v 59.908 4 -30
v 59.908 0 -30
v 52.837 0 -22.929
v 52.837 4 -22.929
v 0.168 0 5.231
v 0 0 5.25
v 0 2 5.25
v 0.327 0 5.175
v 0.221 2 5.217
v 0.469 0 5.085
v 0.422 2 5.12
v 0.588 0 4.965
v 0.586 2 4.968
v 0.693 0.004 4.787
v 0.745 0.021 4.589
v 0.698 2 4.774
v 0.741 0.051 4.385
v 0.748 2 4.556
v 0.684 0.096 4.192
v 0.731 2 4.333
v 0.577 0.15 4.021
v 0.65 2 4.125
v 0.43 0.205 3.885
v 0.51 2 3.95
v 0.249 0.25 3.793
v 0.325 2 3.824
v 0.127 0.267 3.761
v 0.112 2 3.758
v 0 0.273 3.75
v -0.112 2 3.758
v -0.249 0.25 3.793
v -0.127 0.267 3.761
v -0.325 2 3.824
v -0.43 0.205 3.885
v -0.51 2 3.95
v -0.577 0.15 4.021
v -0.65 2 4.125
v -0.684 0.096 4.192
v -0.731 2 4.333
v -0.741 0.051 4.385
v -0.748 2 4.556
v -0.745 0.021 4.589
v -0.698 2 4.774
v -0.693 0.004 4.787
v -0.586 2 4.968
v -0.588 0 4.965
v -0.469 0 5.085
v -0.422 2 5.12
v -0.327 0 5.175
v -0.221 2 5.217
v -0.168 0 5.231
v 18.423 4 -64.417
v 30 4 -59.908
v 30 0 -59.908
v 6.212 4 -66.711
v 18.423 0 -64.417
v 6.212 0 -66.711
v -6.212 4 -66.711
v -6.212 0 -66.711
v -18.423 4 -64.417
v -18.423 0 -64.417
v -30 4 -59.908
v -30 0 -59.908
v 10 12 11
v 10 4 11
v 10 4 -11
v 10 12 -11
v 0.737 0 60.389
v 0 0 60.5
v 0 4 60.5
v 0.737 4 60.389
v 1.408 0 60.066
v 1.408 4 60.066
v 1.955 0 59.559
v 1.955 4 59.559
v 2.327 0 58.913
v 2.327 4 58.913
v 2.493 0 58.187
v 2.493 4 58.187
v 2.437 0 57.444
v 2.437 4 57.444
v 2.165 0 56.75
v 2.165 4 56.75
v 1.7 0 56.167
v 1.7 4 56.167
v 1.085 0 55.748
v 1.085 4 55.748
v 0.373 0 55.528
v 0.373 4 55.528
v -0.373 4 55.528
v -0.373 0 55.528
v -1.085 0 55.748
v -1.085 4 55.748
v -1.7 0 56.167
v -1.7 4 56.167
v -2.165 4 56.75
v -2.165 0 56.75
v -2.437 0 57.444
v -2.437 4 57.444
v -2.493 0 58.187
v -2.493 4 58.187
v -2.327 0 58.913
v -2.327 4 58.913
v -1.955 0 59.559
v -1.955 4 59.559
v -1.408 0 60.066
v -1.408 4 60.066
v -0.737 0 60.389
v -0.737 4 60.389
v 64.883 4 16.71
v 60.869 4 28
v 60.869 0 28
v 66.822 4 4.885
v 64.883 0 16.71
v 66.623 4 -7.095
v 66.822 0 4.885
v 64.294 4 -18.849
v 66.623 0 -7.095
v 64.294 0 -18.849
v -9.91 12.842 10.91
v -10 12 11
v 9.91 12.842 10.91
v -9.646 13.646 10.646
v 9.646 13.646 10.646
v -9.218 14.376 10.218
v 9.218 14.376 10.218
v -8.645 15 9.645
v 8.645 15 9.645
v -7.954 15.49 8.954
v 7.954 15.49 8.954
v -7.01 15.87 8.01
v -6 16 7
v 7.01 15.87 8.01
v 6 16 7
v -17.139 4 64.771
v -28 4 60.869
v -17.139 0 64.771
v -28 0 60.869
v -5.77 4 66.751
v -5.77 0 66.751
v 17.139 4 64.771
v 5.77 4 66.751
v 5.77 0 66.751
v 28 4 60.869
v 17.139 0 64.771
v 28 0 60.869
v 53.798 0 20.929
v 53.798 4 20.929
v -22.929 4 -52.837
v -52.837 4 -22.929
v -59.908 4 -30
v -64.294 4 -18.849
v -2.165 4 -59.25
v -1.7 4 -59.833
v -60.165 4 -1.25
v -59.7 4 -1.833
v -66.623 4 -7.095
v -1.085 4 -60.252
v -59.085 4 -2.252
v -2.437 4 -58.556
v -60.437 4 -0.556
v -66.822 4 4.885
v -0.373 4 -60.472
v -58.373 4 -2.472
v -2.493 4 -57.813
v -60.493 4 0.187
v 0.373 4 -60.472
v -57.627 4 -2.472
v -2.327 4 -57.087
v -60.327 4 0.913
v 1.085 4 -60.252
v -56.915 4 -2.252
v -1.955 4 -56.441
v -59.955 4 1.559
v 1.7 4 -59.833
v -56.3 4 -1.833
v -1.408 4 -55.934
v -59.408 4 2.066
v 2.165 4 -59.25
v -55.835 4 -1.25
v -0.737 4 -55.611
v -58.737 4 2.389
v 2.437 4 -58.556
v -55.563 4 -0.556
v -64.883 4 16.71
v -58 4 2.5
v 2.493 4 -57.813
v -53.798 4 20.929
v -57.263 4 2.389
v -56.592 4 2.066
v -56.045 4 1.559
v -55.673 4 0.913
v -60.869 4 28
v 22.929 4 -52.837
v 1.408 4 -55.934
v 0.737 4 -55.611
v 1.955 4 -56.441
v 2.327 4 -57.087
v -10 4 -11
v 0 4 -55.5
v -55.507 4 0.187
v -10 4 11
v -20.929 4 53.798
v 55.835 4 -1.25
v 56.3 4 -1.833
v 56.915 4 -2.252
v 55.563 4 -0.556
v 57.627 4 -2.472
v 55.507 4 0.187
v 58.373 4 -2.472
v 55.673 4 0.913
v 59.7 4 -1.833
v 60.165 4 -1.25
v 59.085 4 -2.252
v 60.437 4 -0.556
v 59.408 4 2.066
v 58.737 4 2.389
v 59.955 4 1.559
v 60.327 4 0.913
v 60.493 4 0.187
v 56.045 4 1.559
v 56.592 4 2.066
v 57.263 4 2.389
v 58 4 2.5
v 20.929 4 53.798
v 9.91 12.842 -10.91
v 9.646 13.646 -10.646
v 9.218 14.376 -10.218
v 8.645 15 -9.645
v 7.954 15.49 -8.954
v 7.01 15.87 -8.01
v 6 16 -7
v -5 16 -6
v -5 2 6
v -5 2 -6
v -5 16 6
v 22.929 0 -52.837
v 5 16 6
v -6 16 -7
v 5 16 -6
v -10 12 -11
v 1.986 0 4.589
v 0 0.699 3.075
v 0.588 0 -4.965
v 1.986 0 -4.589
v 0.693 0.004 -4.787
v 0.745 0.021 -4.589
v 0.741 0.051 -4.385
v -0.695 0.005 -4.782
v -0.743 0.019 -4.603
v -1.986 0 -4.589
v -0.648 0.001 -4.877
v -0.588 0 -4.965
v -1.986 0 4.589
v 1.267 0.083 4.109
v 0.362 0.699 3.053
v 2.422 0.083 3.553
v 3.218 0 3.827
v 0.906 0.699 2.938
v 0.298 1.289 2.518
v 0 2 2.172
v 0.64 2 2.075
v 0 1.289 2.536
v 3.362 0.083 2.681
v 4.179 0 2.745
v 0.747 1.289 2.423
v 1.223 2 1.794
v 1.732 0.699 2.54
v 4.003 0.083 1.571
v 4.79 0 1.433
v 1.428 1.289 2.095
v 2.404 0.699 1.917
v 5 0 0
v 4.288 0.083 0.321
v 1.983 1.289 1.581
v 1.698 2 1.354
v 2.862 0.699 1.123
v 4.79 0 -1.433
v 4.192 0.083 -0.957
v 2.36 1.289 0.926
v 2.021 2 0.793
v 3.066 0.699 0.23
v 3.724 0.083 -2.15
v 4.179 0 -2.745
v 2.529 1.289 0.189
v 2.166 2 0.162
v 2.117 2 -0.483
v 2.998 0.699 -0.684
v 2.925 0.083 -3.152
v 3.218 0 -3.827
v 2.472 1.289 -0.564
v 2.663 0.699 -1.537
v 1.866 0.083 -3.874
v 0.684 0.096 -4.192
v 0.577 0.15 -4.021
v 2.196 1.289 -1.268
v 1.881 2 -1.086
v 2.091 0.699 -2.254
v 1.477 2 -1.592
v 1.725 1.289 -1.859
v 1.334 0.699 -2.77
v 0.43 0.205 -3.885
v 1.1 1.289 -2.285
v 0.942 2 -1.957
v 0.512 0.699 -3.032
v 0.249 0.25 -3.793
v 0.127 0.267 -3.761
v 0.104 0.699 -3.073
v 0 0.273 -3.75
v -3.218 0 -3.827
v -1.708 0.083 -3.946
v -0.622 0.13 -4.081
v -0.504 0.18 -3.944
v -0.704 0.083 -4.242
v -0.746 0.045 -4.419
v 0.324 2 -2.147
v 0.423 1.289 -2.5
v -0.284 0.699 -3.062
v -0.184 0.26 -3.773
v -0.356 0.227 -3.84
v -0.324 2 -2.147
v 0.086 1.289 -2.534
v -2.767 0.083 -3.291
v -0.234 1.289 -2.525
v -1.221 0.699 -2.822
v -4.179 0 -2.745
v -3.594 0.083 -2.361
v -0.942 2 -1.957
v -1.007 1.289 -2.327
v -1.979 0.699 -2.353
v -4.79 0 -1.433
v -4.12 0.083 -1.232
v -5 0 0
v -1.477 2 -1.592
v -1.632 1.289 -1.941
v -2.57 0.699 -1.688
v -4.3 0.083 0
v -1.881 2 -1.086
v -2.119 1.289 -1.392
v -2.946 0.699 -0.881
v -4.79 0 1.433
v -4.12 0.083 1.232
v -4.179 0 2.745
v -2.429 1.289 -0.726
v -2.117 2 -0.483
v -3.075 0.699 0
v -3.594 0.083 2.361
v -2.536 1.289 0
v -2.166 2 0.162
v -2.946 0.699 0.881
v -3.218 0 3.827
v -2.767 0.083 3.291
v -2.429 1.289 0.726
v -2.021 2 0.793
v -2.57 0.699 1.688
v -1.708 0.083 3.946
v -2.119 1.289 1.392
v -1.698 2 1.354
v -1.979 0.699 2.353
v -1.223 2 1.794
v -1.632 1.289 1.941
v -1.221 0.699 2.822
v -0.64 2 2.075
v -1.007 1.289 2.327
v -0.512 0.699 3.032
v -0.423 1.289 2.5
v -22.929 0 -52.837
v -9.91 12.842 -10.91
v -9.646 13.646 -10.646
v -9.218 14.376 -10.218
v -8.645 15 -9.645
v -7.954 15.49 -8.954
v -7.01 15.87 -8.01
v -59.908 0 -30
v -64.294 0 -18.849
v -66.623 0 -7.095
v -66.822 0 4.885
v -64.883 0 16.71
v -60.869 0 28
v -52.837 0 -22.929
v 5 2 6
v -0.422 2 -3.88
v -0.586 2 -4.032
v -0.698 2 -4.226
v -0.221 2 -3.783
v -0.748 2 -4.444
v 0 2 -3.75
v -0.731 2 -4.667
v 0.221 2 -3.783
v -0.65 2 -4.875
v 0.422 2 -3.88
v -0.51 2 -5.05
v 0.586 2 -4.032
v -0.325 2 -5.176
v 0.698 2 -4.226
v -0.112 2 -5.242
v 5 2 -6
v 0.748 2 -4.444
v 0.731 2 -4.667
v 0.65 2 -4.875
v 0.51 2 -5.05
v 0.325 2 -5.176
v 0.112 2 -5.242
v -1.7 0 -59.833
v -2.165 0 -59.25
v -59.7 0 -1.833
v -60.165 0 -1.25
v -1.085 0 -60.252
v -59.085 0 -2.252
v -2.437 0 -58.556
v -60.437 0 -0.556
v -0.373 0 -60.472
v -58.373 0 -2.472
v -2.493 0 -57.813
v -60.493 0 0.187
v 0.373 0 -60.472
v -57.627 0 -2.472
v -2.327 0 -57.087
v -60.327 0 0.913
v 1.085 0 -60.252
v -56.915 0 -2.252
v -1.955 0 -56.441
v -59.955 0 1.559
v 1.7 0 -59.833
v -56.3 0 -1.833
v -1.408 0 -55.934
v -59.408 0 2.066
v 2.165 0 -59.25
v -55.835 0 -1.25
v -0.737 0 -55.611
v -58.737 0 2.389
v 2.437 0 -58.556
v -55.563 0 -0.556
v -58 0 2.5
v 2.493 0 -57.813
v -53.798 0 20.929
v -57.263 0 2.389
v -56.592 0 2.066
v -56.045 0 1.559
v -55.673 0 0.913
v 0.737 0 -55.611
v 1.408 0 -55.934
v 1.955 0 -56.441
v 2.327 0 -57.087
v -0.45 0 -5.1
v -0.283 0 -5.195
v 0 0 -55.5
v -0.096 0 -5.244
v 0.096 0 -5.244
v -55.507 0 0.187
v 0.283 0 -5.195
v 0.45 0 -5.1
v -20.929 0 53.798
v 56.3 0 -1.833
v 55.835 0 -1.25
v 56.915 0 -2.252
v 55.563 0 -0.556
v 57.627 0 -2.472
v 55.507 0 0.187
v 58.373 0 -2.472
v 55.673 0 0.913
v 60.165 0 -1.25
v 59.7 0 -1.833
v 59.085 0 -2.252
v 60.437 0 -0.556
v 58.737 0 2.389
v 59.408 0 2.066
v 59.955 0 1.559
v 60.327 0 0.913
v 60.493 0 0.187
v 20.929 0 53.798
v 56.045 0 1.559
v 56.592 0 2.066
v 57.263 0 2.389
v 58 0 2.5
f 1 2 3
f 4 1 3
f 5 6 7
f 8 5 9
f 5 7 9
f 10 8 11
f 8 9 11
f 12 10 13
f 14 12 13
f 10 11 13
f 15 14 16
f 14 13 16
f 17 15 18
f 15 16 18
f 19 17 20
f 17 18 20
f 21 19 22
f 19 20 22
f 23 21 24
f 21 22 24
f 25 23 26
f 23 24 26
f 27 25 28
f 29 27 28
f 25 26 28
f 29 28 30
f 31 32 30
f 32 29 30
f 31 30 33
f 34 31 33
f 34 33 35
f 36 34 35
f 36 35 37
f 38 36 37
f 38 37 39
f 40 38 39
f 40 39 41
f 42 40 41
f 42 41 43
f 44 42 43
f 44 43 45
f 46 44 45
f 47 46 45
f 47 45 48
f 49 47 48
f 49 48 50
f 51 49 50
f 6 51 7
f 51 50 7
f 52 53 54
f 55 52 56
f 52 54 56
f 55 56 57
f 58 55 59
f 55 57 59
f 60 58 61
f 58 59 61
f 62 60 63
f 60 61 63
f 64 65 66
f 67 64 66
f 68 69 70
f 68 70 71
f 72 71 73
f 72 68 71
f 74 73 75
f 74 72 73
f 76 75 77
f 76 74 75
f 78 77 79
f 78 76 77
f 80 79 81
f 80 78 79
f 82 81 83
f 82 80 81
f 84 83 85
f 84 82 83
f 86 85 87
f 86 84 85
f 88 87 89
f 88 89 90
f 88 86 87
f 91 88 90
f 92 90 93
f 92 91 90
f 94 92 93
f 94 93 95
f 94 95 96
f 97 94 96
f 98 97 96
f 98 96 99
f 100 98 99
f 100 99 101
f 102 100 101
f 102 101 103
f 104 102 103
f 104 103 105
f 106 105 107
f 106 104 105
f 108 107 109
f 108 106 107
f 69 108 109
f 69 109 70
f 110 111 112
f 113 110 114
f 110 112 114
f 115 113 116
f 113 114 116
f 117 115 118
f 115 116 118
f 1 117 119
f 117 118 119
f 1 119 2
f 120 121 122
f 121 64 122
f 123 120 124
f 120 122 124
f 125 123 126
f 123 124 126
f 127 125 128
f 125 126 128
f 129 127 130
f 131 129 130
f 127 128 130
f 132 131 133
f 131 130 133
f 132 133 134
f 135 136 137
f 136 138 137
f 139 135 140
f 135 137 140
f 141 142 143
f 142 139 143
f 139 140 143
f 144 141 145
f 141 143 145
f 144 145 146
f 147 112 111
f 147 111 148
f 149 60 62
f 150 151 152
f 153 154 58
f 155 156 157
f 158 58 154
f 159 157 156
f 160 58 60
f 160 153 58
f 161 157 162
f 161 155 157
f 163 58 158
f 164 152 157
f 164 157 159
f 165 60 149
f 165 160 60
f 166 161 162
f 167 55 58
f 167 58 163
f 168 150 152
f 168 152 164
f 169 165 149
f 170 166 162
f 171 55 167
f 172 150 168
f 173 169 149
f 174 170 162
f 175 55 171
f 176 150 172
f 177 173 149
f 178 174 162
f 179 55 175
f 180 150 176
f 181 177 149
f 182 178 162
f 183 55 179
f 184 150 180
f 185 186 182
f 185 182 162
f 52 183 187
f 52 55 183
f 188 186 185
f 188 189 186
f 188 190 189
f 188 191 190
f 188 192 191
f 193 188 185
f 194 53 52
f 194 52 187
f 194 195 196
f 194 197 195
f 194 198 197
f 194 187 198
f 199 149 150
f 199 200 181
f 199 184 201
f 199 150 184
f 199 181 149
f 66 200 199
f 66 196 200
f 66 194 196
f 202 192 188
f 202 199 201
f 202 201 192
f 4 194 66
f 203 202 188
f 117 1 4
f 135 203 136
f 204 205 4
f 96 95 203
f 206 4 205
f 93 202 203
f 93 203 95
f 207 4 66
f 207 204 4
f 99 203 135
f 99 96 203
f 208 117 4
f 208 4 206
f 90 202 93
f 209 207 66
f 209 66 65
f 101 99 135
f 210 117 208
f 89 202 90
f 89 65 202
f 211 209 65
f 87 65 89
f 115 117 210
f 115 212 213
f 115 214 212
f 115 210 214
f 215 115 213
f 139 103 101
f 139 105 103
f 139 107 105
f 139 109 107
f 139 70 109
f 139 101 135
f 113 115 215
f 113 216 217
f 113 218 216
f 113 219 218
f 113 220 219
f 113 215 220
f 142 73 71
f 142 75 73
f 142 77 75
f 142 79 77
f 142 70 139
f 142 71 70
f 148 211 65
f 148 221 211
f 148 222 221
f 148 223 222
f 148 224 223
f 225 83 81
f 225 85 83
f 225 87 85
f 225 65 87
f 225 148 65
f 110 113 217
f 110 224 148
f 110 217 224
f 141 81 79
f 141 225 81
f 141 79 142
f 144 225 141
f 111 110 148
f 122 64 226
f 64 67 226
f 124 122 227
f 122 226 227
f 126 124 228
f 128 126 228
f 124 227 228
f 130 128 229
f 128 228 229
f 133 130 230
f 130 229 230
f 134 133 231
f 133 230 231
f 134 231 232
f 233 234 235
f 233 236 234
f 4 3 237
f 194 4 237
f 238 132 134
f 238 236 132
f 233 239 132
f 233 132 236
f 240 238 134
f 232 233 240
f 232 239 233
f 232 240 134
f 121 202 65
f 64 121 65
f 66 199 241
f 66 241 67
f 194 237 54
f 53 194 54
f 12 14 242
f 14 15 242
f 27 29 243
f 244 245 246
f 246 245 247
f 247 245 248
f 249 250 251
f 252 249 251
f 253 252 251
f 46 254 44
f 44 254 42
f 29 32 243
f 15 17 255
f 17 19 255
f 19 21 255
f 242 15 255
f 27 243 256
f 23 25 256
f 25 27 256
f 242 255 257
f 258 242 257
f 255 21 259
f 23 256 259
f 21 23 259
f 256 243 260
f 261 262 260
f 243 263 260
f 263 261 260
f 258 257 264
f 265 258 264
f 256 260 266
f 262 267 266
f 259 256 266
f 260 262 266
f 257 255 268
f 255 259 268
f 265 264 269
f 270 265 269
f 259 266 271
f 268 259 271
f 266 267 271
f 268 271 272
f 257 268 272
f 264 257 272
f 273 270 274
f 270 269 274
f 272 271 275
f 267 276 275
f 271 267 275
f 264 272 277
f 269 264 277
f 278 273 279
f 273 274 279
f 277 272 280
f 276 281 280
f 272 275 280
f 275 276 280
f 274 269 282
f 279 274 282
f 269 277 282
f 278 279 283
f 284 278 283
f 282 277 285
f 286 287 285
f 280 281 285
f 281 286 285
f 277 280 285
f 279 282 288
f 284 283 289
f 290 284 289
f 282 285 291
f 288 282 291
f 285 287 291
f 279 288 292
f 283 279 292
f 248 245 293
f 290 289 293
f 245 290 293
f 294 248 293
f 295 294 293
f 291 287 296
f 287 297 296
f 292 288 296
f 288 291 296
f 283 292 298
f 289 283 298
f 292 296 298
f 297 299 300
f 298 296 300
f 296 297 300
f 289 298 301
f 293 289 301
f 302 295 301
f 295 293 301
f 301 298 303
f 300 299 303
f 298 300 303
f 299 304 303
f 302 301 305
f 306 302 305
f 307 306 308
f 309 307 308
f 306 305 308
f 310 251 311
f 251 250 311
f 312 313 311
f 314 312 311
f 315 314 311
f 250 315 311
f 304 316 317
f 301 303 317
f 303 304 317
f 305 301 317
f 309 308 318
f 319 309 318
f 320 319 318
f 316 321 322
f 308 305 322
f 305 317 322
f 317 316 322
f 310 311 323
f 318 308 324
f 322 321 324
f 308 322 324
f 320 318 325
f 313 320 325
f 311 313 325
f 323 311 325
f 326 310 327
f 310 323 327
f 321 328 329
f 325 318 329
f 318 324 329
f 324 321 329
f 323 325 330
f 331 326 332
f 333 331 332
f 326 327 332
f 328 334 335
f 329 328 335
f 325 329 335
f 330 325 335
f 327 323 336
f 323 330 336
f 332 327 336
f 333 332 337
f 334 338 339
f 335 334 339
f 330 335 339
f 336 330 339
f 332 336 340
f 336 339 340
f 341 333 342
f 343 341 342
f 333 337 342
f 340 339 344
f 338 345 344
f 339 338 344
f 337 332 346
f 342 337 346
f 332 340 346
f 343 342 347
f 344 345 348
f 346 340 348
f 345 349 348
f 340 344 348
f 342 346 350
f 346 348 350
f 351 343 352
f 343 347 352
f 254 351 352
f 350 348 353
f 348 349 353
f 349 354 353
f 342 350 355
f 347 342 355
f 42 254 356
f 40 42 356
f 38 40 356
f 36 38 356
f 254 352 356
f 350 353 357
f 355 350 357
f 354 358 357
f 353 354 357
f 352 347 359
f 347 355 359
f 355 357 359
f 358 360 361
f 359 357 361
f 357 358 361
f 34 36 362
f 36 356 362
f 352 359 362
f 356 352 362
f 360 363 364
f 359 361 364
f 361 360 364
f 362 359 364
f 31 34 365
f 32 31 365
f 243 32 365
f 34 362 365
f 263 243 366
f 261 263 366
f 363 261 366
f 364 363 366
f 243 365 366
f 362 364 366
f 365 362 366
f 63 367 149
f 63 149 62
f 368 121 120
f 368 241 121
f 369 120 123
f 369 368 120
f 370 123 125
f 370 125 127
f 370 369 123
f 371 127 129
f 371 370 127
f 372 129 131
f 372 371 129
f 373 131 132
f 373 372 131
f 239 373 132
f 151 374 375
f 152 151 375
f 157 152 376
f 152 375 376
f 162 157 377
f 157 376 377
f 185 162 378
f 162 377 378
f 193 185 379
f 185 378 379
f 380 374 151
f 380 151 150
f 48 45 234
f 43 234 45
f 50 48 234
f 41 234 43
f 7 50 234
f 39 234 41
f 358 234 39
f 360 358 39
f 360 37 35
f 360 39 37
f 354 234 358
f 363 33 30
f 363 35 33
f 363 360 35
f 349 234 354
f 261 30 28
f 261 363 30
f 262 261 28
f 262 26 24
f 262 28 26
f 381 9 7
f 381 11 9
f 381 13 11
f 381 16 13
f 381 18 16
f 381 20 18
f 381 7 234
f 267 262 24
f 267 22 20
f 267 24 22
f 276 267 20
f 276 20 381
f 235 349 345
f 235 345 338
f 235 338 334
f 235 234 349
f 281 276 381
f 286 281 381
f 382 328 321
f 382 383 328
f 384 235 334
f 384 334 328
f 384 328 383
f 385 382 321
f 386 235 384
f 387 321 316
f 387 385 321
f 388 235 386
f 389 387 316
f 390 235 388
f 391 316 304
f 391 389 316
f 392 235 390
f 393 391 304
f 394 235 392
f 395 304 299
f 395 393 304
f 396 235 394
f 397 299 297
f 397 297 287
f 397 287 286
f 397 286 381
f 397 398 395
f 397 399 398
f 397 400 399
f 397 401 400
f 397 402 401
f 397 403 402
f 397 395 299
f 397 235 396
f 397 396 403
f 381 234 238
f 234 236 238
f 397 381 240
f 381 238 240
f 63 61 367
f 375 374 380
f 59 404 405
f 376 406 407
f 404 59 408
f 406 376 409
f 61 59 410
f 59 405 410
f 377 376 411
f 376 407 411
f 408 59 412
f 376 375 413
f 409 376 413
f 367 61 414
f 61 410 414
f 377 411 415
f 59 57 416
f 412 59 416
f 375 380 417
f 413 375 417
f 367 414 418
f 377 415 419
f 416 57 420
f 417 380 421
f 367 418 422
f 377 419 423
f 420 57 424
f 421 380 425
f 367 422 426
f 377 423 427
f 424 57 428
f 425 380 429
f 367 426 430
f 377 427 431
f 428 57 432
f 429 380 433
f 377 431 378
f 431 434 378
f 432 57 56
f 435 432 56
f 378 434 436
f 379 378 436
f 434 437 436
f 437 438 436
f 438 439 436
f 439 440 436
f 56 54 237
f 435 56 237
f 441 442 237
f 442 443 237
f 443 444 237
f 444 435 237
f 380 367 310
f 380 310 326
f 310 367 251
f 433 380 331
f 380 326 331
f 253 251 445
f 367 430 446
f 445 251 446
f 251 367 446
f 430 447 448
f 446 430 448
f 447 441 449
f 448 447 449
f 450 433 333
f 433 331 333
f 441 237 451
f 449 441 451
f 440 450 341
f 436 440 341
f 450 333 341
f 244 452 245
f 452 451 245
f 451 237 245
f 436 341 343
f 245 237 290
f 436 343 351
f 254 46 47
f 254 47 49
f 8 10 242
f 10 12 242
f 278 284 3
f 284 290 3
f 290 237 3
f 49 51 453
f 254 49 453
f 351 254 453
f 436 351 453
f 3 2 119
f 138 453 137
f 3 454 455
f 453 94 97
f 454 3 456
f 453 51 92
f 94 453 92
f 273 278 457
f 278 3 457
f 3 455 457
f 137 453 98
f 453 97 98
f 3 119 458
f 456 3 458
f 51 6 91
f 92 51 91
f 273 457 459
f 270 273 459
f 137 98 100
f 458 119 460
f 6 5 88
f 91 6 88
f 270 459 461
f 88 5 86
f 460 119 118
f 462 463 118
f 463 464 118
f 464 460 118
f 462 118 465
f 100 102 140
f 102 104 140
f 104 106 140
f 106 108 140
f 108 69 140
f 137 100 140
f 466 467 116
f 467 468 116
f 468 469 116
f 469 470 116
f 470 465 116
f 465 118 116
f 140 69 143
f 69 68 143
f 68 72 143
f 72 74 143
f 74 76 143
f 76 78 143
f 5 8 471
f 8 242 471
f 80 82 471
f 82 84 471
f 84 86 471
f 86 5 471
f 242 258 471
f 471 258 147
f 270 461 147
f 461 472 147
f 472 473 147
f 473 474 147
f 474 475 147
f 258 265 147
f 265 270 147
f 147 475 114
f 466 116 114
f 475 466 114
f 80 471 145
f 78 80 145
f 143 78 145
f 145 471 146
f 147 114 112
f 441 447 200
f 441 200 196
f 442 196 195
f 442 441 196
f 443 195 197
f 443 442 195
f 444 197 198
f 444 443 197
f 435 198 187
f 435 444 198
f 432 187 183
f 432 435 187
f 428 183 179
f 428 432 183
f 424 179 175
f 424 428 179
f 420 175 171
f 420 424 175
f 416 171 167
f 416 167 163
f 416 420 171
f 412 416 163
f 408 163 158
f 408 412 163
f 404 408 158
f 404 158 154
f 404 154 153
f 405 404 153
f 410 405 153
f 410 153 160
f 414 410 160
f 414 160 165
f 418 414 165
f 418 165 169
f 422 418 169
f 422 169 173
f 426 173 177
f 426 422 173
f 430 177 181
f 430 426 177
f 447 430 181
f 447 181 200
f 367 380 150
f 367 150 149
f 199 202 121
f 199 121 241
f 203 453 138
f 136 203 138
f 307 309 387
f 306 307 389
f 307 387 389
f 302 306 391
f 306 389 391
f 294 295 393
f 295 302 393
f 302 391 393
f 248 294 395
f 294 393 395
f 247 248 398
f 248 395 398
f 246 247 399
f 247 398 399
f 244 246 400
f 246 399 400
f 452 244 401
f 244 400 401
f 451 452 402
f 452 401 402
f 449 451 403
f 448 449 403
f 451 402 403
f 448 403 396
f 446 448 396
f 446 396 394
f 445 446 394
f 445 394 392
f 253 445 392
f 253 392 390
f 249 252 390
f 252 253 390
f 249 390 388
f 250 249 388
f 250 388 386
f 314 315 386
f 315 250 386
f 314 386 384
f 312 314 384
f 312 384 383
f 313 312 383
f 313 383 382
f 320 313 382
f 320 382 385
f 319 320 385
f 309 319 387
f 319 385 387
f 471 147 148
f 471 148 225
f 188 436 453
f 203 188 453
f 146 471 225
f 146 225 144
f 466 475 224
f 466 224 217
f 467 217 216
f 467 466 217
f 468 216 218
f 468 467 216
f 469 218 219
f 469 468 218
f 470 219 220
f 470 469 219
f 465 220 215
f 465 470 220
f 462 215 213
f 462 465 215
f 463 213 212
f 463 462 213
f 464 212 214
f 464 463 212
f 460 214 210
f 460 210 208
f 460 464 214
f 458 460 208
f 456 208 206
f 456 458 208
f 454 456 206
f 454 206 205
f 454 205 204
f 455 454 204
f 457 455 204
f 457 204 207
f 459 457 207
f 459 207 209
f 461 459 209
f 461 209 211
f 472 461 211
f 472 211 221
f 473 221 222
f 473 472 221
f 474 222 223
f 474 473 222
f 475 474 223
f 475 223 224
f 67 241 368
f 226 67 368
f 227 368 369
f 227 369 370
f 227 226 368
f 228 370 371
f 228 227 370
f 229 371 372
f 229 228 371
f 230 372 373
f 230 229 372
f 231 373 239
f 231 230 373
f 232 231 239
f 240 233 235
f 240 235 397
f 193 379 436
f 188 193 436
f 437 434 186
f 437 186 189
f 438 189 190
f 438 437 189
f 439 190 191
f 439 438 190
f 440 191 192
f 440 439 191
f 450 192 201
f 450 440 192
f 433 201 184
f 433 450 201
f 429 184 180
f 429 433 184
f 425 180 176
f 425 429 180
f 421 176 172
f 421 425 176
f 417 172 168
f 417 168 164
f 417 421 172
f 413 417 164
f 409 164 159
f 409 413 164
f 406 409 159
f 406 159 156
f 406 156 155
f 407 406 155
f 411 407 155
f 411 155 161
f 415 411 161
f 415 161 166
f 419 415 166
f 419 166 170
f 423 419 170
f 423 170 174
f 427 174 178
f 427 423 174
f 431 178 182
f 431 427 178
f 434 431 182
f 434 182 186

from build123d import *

# Parameters (mm, degrees)
SKETCH1_R           = 67
SKETCH1_R_2         = 2.5
BOSS_EXTRUDE1_DEPTH = 4
SKETCH2_R           = 2
CUT_EXTRUDE1_DEPTH  = 4
SKETCH4_W           = 20
SKETCH4_H           = 22
SKETCH4_W_2         = 10
SKETCH4_H_2         = 12
BOSS_EXTRUDE2_DEPTH = 12
FILLET1_R           = 4
FILLET2_R           = 3
CUT_EXTRUDE2_START  = -10
CUT_EXTRUDE2_DEPTH  = 10
SKETCH7_R           = 0.75
CUT_EXTRUDE3_DEPTH  = 10
SKETCH8_W           = 10
SKETCH8_H           = 12
CUT_EXTRUDE4_DEPTH  = 2


with BuildPart() as part:
    # Sketch1 → Boss-Extrude1 (new body)
    with BuildSketch(Plane(origin=(0, 0, 0), x_dir=(1, 0, 0), z_dir=(0, 1, 0))):
        with Locations(Location((0, 0, 0), (0, 0, 270))):
            Circle(SKETCH1_R)
        with Locations(Location((-58, 0, 0), (0, 0, 270))):
            Circle(SKETCH1_R_2, mode=Mode.SUBTRACT)
        with Locations(Location((0, -58, 0), (0, 0, 270))):
            Circle(SKETCH1_R_2, mode=Mode.SUBTRACT)
        with Locations(Location((58, 0, 0), (0, 0, 270))):
            Circle(SKETCH1_R_2, mode=Mode.SUBTRACT)
        with Locations(Location((0, 58, 0), (0, 0, 270))):
            Circle(SKETCH1_R_2, mode=Mode.SUBTRACT)
    extrude(amount=BOSS_EXTRUDE1_DEPTH)

    # Sketch2 → Cut-Extrude1 (cut)
    with BuildSketch(Plane(origin=(0, 4, 0), x_dir=(1, 0, 0), z_dir=(0, 1, 0))):
        with Locations(Location((0, 0, 0), (0, 0, 270))):
            Circle(SKETCH2_R)
    extrude(amount=-CUT_EXTRUDE1_DEPTH, mode=Mode.SUBTRACT)

    # Sketch4 → Boss-Extrude2 (add)
    with BuildSketch(Plane(origin=(0, 4, 0), x_dir=(1, 0, 0), z_dir=(0, 1, 0))):
        Rectangle(SKETCH4_W, SKETCH4_H)
        Rectangle(SKETCH4_W_2, SKETCH4_H_2, mode=Mode.SUBTRACT)
    extrude(amount=BOSS_EXTRUDE2_DEPTH)

    # Fillet1
    fillet1_edges = [part.edges().sort_by_distance(p)[0] for p in [
        (10, 16, 0),
        (0, 16, -11),
        (-10, 16, 0),
        (0, 16, 11),
    ]]
    fillet(fillet1_edges, radius=FILLET1_R)

    # Fillet2
    fillet2_edges = [part.edges().sort_by_distance(p)[0] for p in [
        (0, 0, -2),
    ]]
    fillet(fillet2_edges, radius=FILLET2_R)

    # Sketch5 → Cut-Extrude2 (cut)
    with BuildSketch(Plane(origin=(0, 4, 0), x_dir=(1, 0, 0), z_dir=(0, 1, 0)).offset(CUT_EXTRUDE2_START)):
        with BuildLine():
            Line((59.908263203, 30), (52.837195391, 22.928932188))
            Line((52.837195391, 22.928932188), (22.928932188, 52.837195391))
            Line((22.928932188, 52.837195391), (30, 59.908263203))
            ThreePointArc((30, 59.908263203), (47.376154339, 47.376154339), (59.908263203, 30))
        make_face()
        with BuildLine():
            Line((-59.908263203, 30), (-52.837195391, 22.928932188))
            Line((-52.837195391, 22.928932188), (-22.928932188, 52.837195391))
            Line((-22.928932188, 52.837195391), (-30, 59.908263203))
            ThreePointArc((-30, 59.908263203), (-47.376154339, 47.376154339), (-59.908263203, 30))
        make_face()
        with BuildLine():
            Line((-53.797643362, -20.928932188), (-20.928932188, -53.797643362))
            Line((-20.928932188, -53.797643362), (-28, -60.868711174))
            ThreePointArc((-28, -60.868711174), (-47.376154339, -47.376154339), (-60.868711174, -28))
            Line((-60.868711174, -28), (-53.797643362, -20.928932188))
        make_face()
        with BuildLine():
            Line((53.797643362, -20.928932188), (20.928932188, -53.797643362))
            Line((20.928932188, -53.797643362), (28, -60.868711174))
            ThreePointArc((28, -60.868711174), (47.376154339, -47.376154339), (60.868711174, -28))
            Line((60.868711174, -28), (53.797643362, -20.928932188))
        make_face()
    extrude(amount=CUT_EXTRUDE2_DEPTH, mode=Mode.SUBTRACT)

    # Sketch7 → Cut-Extrude3 (cut)
    with BuildSketch(Plane(origin=(0, 4, 0), x_dir=(1, 0, 0), z_dir=(0, 1, 0))):
        with Locations(Location((0, 4.5, 0), (0, 0, 270))):
            Circle(SKETCH7_R)
        with Locations(Location((0, -4.5, 0), (0, 0, 270))):
            Circle(SKETCH7_R)
    extrude(amount=-CUT_EXTRUDE3_DEPTH, mode=Mode.SUBTRACT)

    # Sketch8 → Cut-Extrude4 (cut)
    with BuildSketch(Plane(origin=(0, 4, 0), x_dir=(1, 0, 0), z_dir=(0, 1, 0))):
        Rectangle(SKETCH8_W, SKETCH8_H)
    extrude(amount=-CUT_EXTRUDE4_DEPTH, mode=Mode.SUBTRACT)


solid = part.part
